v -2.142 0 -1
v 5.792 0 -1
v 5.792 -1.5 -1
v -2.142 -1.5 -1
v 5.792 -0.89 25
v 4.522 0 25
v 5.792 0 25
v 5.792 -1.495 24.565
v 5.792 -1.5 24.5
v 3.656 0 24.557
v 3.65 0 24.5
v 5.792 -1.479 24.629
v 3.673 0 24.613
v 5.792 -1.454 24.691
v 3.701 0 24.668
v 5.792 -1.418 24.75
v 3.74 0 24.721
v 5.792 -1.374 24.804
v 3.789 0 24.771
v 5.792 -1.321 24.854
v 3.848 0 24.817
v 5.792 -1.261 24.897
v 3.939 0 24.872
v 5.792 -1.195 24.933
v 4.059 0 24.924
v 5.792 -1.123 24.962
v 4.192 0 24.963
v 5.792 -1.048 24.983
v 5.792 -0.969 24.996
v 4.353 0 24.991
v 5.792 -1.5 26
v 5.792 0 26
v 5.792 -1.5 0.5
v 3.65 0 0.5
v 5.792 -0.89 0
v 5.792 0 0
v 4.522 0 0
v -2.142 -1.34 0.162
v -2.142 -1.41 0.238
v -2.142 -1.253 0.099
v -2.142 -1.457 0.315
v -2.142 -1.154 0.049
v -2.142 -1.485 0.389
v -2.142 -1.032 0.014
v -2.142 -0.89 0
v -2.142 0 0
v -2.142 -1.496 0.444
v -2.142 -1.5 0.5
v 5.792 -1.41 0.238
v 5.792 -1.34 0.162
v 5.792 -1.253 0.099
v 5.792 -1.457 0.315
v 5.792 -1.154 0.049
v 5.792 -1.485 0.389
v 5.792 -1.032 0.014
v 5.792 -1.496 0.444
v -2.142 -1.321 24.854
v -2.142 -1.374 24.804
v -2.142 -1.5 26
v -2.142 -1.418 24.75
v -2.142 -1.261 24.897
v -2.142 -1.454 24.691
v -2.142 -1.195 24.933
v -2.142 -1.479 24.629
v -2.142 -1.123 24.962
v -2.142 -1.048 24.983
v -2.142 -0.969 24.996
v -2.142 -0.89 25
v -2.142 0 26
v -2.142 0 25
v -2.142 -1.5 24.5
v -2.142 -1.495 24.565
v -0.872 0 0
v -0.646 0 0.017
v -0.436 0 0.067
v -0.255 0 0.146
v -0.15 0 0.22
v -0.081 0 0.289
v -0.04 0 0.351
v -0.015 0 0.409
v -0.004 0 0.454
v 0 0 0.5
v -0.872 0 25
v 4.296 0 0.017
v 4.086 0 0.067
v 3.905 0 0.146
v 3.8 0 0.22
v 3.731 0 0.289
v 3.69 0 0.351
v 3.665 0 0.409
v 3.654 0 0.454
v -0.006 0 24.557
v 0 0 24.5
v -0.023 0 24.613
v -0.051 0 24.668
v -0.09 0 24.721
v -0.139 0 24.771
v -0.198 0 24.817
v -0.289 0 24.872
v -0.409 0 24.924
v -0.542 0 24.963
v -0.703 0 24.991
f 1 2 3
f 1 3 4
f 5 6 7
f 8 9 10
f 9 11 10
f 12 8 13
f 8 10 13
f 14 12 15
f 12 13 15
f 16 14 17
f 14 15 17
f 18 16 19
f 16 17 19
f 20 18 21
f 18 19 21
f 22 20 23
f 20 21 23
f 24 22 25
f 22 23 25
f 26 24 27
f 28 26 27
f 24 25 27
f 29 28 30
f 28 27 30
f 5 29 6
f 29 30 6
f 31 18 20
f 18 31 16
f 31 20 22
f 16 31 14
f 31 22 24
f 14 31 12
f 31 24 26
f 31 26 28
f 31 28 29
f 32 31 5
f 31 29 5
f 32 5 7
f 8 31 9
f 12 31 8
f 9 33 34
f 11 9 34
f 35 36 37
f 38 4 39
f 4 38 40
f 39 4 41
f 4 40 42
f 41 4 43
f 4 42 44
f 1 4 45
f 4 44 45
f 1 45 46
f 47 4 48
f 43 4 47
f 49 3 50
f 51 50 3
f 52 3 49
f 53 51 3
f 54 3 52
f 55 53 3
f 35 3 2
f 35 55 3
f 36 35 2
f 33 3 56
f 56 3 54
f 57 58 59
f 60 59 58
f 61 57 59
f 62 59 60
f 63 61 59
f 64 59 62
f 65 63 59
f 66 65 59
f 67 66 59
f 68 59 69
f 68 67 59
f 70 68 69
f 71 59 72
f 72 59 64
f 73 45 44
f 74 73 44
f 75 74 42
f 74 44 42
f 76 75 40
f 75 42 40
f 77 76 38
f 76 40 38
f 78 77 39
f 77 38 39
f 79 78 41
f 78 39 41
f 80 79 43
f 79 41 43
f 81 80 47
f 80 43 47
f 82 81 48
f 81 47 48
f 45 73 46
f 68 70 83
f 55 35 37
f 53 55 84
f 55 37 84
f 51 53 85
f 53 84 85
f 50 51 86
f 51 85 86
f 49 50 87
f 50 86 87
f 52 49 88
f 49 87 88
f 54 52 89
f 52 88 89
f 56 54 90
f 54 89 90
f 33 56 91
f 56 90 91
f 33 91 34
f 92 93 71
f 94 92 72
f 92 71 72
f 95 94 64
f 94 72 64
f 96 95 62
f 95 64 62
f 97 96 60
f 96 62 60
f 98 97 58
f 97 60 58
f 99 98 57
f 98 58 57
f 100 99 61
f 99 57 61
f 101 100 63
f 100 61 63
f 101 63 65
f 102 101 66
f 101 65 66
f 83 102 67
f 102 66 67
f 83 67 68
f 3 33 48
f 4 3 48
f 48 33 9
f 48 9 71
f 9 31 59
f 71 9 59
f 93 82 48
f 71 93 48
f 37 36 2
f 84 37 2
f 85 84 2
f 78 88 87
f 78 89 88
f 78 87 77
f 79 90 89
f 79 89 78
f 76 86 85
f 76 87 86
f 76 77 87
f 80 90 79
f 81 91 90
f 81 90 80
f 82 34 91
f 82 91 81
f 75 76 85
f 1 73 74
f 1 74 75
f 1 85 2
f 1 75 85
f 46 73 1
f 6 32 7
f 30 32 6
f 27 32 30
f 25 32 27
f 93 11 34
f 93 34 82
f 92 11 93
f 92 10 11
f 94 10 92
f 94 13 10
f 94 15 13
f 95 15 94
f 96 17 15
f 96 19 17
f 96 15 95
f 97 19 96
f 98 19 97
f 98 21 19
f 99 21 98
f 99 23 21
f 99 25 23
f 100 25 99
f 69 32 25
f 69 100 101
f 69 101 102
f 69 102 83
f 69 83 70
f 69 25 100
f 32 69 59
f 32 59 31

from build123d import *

# Parameters (mm, degrees)
BOSS_EXTRUDE1_DEPTH = 25
SKETCH2_W           = 7.93444402
SKETCH2_H           = 1.5
BOSS_EXTRUDE2_DEPTH = 1
SKETCH3_W           = 7.93444402
SKETCH3_H           = 1.5
BOSS_EXTRUDE3_DEPTH = 1
FILLET1_R           = 0.5


with BuildPart() as part:
    # Sketch1 → Boss-Extrude1 (new body)
    with BuildSketch(Plane.XY):
        Polygon((0, 0), (-2.14222201, -1.5), (5.79222201, -1.5), (3.65, 0), align=None)
    extrude(amount=BOSS_EXTRUDE1_DEPTH)

    # Sketch2 → Boss-Extrude2 (add)
    with BuildSketch(Plane.XY.offset(25)):
        with Locations((1.825, -0.75)):
            Rectangle(SKETCH2_W, SKETCH2_H)
    extrude(amount=BOSS_EXTRUDE2_DEPTH)

    # Sketch3 → Boss-Extrude3 (add)
    with BuildSketch(Plane(origin=(0, 0, 0), x_dir=(-1, 0, 0), z_dir=(0, 0, -1))):
        with Locations((-1.825, -0.75)):
            Rectangle(SKETCH3_W, SKETCH3_H)
    extrude(amount=BOSS_EXTRUDE3_DEPTH)

    # Fillet1
    fillet1_edges = [part.edges().sort_by_distance(p)[0] for p in [
        (4.721111005, -0.75, 25),
        (4.721111005, -0.75, 0),
        (-1.071111005, -0.75, 0),
        (-1.071111005, -0.75, 25),
    ]]
    fillet(fillet1_edges, radius=FILLET1_R)


solid = part.part
